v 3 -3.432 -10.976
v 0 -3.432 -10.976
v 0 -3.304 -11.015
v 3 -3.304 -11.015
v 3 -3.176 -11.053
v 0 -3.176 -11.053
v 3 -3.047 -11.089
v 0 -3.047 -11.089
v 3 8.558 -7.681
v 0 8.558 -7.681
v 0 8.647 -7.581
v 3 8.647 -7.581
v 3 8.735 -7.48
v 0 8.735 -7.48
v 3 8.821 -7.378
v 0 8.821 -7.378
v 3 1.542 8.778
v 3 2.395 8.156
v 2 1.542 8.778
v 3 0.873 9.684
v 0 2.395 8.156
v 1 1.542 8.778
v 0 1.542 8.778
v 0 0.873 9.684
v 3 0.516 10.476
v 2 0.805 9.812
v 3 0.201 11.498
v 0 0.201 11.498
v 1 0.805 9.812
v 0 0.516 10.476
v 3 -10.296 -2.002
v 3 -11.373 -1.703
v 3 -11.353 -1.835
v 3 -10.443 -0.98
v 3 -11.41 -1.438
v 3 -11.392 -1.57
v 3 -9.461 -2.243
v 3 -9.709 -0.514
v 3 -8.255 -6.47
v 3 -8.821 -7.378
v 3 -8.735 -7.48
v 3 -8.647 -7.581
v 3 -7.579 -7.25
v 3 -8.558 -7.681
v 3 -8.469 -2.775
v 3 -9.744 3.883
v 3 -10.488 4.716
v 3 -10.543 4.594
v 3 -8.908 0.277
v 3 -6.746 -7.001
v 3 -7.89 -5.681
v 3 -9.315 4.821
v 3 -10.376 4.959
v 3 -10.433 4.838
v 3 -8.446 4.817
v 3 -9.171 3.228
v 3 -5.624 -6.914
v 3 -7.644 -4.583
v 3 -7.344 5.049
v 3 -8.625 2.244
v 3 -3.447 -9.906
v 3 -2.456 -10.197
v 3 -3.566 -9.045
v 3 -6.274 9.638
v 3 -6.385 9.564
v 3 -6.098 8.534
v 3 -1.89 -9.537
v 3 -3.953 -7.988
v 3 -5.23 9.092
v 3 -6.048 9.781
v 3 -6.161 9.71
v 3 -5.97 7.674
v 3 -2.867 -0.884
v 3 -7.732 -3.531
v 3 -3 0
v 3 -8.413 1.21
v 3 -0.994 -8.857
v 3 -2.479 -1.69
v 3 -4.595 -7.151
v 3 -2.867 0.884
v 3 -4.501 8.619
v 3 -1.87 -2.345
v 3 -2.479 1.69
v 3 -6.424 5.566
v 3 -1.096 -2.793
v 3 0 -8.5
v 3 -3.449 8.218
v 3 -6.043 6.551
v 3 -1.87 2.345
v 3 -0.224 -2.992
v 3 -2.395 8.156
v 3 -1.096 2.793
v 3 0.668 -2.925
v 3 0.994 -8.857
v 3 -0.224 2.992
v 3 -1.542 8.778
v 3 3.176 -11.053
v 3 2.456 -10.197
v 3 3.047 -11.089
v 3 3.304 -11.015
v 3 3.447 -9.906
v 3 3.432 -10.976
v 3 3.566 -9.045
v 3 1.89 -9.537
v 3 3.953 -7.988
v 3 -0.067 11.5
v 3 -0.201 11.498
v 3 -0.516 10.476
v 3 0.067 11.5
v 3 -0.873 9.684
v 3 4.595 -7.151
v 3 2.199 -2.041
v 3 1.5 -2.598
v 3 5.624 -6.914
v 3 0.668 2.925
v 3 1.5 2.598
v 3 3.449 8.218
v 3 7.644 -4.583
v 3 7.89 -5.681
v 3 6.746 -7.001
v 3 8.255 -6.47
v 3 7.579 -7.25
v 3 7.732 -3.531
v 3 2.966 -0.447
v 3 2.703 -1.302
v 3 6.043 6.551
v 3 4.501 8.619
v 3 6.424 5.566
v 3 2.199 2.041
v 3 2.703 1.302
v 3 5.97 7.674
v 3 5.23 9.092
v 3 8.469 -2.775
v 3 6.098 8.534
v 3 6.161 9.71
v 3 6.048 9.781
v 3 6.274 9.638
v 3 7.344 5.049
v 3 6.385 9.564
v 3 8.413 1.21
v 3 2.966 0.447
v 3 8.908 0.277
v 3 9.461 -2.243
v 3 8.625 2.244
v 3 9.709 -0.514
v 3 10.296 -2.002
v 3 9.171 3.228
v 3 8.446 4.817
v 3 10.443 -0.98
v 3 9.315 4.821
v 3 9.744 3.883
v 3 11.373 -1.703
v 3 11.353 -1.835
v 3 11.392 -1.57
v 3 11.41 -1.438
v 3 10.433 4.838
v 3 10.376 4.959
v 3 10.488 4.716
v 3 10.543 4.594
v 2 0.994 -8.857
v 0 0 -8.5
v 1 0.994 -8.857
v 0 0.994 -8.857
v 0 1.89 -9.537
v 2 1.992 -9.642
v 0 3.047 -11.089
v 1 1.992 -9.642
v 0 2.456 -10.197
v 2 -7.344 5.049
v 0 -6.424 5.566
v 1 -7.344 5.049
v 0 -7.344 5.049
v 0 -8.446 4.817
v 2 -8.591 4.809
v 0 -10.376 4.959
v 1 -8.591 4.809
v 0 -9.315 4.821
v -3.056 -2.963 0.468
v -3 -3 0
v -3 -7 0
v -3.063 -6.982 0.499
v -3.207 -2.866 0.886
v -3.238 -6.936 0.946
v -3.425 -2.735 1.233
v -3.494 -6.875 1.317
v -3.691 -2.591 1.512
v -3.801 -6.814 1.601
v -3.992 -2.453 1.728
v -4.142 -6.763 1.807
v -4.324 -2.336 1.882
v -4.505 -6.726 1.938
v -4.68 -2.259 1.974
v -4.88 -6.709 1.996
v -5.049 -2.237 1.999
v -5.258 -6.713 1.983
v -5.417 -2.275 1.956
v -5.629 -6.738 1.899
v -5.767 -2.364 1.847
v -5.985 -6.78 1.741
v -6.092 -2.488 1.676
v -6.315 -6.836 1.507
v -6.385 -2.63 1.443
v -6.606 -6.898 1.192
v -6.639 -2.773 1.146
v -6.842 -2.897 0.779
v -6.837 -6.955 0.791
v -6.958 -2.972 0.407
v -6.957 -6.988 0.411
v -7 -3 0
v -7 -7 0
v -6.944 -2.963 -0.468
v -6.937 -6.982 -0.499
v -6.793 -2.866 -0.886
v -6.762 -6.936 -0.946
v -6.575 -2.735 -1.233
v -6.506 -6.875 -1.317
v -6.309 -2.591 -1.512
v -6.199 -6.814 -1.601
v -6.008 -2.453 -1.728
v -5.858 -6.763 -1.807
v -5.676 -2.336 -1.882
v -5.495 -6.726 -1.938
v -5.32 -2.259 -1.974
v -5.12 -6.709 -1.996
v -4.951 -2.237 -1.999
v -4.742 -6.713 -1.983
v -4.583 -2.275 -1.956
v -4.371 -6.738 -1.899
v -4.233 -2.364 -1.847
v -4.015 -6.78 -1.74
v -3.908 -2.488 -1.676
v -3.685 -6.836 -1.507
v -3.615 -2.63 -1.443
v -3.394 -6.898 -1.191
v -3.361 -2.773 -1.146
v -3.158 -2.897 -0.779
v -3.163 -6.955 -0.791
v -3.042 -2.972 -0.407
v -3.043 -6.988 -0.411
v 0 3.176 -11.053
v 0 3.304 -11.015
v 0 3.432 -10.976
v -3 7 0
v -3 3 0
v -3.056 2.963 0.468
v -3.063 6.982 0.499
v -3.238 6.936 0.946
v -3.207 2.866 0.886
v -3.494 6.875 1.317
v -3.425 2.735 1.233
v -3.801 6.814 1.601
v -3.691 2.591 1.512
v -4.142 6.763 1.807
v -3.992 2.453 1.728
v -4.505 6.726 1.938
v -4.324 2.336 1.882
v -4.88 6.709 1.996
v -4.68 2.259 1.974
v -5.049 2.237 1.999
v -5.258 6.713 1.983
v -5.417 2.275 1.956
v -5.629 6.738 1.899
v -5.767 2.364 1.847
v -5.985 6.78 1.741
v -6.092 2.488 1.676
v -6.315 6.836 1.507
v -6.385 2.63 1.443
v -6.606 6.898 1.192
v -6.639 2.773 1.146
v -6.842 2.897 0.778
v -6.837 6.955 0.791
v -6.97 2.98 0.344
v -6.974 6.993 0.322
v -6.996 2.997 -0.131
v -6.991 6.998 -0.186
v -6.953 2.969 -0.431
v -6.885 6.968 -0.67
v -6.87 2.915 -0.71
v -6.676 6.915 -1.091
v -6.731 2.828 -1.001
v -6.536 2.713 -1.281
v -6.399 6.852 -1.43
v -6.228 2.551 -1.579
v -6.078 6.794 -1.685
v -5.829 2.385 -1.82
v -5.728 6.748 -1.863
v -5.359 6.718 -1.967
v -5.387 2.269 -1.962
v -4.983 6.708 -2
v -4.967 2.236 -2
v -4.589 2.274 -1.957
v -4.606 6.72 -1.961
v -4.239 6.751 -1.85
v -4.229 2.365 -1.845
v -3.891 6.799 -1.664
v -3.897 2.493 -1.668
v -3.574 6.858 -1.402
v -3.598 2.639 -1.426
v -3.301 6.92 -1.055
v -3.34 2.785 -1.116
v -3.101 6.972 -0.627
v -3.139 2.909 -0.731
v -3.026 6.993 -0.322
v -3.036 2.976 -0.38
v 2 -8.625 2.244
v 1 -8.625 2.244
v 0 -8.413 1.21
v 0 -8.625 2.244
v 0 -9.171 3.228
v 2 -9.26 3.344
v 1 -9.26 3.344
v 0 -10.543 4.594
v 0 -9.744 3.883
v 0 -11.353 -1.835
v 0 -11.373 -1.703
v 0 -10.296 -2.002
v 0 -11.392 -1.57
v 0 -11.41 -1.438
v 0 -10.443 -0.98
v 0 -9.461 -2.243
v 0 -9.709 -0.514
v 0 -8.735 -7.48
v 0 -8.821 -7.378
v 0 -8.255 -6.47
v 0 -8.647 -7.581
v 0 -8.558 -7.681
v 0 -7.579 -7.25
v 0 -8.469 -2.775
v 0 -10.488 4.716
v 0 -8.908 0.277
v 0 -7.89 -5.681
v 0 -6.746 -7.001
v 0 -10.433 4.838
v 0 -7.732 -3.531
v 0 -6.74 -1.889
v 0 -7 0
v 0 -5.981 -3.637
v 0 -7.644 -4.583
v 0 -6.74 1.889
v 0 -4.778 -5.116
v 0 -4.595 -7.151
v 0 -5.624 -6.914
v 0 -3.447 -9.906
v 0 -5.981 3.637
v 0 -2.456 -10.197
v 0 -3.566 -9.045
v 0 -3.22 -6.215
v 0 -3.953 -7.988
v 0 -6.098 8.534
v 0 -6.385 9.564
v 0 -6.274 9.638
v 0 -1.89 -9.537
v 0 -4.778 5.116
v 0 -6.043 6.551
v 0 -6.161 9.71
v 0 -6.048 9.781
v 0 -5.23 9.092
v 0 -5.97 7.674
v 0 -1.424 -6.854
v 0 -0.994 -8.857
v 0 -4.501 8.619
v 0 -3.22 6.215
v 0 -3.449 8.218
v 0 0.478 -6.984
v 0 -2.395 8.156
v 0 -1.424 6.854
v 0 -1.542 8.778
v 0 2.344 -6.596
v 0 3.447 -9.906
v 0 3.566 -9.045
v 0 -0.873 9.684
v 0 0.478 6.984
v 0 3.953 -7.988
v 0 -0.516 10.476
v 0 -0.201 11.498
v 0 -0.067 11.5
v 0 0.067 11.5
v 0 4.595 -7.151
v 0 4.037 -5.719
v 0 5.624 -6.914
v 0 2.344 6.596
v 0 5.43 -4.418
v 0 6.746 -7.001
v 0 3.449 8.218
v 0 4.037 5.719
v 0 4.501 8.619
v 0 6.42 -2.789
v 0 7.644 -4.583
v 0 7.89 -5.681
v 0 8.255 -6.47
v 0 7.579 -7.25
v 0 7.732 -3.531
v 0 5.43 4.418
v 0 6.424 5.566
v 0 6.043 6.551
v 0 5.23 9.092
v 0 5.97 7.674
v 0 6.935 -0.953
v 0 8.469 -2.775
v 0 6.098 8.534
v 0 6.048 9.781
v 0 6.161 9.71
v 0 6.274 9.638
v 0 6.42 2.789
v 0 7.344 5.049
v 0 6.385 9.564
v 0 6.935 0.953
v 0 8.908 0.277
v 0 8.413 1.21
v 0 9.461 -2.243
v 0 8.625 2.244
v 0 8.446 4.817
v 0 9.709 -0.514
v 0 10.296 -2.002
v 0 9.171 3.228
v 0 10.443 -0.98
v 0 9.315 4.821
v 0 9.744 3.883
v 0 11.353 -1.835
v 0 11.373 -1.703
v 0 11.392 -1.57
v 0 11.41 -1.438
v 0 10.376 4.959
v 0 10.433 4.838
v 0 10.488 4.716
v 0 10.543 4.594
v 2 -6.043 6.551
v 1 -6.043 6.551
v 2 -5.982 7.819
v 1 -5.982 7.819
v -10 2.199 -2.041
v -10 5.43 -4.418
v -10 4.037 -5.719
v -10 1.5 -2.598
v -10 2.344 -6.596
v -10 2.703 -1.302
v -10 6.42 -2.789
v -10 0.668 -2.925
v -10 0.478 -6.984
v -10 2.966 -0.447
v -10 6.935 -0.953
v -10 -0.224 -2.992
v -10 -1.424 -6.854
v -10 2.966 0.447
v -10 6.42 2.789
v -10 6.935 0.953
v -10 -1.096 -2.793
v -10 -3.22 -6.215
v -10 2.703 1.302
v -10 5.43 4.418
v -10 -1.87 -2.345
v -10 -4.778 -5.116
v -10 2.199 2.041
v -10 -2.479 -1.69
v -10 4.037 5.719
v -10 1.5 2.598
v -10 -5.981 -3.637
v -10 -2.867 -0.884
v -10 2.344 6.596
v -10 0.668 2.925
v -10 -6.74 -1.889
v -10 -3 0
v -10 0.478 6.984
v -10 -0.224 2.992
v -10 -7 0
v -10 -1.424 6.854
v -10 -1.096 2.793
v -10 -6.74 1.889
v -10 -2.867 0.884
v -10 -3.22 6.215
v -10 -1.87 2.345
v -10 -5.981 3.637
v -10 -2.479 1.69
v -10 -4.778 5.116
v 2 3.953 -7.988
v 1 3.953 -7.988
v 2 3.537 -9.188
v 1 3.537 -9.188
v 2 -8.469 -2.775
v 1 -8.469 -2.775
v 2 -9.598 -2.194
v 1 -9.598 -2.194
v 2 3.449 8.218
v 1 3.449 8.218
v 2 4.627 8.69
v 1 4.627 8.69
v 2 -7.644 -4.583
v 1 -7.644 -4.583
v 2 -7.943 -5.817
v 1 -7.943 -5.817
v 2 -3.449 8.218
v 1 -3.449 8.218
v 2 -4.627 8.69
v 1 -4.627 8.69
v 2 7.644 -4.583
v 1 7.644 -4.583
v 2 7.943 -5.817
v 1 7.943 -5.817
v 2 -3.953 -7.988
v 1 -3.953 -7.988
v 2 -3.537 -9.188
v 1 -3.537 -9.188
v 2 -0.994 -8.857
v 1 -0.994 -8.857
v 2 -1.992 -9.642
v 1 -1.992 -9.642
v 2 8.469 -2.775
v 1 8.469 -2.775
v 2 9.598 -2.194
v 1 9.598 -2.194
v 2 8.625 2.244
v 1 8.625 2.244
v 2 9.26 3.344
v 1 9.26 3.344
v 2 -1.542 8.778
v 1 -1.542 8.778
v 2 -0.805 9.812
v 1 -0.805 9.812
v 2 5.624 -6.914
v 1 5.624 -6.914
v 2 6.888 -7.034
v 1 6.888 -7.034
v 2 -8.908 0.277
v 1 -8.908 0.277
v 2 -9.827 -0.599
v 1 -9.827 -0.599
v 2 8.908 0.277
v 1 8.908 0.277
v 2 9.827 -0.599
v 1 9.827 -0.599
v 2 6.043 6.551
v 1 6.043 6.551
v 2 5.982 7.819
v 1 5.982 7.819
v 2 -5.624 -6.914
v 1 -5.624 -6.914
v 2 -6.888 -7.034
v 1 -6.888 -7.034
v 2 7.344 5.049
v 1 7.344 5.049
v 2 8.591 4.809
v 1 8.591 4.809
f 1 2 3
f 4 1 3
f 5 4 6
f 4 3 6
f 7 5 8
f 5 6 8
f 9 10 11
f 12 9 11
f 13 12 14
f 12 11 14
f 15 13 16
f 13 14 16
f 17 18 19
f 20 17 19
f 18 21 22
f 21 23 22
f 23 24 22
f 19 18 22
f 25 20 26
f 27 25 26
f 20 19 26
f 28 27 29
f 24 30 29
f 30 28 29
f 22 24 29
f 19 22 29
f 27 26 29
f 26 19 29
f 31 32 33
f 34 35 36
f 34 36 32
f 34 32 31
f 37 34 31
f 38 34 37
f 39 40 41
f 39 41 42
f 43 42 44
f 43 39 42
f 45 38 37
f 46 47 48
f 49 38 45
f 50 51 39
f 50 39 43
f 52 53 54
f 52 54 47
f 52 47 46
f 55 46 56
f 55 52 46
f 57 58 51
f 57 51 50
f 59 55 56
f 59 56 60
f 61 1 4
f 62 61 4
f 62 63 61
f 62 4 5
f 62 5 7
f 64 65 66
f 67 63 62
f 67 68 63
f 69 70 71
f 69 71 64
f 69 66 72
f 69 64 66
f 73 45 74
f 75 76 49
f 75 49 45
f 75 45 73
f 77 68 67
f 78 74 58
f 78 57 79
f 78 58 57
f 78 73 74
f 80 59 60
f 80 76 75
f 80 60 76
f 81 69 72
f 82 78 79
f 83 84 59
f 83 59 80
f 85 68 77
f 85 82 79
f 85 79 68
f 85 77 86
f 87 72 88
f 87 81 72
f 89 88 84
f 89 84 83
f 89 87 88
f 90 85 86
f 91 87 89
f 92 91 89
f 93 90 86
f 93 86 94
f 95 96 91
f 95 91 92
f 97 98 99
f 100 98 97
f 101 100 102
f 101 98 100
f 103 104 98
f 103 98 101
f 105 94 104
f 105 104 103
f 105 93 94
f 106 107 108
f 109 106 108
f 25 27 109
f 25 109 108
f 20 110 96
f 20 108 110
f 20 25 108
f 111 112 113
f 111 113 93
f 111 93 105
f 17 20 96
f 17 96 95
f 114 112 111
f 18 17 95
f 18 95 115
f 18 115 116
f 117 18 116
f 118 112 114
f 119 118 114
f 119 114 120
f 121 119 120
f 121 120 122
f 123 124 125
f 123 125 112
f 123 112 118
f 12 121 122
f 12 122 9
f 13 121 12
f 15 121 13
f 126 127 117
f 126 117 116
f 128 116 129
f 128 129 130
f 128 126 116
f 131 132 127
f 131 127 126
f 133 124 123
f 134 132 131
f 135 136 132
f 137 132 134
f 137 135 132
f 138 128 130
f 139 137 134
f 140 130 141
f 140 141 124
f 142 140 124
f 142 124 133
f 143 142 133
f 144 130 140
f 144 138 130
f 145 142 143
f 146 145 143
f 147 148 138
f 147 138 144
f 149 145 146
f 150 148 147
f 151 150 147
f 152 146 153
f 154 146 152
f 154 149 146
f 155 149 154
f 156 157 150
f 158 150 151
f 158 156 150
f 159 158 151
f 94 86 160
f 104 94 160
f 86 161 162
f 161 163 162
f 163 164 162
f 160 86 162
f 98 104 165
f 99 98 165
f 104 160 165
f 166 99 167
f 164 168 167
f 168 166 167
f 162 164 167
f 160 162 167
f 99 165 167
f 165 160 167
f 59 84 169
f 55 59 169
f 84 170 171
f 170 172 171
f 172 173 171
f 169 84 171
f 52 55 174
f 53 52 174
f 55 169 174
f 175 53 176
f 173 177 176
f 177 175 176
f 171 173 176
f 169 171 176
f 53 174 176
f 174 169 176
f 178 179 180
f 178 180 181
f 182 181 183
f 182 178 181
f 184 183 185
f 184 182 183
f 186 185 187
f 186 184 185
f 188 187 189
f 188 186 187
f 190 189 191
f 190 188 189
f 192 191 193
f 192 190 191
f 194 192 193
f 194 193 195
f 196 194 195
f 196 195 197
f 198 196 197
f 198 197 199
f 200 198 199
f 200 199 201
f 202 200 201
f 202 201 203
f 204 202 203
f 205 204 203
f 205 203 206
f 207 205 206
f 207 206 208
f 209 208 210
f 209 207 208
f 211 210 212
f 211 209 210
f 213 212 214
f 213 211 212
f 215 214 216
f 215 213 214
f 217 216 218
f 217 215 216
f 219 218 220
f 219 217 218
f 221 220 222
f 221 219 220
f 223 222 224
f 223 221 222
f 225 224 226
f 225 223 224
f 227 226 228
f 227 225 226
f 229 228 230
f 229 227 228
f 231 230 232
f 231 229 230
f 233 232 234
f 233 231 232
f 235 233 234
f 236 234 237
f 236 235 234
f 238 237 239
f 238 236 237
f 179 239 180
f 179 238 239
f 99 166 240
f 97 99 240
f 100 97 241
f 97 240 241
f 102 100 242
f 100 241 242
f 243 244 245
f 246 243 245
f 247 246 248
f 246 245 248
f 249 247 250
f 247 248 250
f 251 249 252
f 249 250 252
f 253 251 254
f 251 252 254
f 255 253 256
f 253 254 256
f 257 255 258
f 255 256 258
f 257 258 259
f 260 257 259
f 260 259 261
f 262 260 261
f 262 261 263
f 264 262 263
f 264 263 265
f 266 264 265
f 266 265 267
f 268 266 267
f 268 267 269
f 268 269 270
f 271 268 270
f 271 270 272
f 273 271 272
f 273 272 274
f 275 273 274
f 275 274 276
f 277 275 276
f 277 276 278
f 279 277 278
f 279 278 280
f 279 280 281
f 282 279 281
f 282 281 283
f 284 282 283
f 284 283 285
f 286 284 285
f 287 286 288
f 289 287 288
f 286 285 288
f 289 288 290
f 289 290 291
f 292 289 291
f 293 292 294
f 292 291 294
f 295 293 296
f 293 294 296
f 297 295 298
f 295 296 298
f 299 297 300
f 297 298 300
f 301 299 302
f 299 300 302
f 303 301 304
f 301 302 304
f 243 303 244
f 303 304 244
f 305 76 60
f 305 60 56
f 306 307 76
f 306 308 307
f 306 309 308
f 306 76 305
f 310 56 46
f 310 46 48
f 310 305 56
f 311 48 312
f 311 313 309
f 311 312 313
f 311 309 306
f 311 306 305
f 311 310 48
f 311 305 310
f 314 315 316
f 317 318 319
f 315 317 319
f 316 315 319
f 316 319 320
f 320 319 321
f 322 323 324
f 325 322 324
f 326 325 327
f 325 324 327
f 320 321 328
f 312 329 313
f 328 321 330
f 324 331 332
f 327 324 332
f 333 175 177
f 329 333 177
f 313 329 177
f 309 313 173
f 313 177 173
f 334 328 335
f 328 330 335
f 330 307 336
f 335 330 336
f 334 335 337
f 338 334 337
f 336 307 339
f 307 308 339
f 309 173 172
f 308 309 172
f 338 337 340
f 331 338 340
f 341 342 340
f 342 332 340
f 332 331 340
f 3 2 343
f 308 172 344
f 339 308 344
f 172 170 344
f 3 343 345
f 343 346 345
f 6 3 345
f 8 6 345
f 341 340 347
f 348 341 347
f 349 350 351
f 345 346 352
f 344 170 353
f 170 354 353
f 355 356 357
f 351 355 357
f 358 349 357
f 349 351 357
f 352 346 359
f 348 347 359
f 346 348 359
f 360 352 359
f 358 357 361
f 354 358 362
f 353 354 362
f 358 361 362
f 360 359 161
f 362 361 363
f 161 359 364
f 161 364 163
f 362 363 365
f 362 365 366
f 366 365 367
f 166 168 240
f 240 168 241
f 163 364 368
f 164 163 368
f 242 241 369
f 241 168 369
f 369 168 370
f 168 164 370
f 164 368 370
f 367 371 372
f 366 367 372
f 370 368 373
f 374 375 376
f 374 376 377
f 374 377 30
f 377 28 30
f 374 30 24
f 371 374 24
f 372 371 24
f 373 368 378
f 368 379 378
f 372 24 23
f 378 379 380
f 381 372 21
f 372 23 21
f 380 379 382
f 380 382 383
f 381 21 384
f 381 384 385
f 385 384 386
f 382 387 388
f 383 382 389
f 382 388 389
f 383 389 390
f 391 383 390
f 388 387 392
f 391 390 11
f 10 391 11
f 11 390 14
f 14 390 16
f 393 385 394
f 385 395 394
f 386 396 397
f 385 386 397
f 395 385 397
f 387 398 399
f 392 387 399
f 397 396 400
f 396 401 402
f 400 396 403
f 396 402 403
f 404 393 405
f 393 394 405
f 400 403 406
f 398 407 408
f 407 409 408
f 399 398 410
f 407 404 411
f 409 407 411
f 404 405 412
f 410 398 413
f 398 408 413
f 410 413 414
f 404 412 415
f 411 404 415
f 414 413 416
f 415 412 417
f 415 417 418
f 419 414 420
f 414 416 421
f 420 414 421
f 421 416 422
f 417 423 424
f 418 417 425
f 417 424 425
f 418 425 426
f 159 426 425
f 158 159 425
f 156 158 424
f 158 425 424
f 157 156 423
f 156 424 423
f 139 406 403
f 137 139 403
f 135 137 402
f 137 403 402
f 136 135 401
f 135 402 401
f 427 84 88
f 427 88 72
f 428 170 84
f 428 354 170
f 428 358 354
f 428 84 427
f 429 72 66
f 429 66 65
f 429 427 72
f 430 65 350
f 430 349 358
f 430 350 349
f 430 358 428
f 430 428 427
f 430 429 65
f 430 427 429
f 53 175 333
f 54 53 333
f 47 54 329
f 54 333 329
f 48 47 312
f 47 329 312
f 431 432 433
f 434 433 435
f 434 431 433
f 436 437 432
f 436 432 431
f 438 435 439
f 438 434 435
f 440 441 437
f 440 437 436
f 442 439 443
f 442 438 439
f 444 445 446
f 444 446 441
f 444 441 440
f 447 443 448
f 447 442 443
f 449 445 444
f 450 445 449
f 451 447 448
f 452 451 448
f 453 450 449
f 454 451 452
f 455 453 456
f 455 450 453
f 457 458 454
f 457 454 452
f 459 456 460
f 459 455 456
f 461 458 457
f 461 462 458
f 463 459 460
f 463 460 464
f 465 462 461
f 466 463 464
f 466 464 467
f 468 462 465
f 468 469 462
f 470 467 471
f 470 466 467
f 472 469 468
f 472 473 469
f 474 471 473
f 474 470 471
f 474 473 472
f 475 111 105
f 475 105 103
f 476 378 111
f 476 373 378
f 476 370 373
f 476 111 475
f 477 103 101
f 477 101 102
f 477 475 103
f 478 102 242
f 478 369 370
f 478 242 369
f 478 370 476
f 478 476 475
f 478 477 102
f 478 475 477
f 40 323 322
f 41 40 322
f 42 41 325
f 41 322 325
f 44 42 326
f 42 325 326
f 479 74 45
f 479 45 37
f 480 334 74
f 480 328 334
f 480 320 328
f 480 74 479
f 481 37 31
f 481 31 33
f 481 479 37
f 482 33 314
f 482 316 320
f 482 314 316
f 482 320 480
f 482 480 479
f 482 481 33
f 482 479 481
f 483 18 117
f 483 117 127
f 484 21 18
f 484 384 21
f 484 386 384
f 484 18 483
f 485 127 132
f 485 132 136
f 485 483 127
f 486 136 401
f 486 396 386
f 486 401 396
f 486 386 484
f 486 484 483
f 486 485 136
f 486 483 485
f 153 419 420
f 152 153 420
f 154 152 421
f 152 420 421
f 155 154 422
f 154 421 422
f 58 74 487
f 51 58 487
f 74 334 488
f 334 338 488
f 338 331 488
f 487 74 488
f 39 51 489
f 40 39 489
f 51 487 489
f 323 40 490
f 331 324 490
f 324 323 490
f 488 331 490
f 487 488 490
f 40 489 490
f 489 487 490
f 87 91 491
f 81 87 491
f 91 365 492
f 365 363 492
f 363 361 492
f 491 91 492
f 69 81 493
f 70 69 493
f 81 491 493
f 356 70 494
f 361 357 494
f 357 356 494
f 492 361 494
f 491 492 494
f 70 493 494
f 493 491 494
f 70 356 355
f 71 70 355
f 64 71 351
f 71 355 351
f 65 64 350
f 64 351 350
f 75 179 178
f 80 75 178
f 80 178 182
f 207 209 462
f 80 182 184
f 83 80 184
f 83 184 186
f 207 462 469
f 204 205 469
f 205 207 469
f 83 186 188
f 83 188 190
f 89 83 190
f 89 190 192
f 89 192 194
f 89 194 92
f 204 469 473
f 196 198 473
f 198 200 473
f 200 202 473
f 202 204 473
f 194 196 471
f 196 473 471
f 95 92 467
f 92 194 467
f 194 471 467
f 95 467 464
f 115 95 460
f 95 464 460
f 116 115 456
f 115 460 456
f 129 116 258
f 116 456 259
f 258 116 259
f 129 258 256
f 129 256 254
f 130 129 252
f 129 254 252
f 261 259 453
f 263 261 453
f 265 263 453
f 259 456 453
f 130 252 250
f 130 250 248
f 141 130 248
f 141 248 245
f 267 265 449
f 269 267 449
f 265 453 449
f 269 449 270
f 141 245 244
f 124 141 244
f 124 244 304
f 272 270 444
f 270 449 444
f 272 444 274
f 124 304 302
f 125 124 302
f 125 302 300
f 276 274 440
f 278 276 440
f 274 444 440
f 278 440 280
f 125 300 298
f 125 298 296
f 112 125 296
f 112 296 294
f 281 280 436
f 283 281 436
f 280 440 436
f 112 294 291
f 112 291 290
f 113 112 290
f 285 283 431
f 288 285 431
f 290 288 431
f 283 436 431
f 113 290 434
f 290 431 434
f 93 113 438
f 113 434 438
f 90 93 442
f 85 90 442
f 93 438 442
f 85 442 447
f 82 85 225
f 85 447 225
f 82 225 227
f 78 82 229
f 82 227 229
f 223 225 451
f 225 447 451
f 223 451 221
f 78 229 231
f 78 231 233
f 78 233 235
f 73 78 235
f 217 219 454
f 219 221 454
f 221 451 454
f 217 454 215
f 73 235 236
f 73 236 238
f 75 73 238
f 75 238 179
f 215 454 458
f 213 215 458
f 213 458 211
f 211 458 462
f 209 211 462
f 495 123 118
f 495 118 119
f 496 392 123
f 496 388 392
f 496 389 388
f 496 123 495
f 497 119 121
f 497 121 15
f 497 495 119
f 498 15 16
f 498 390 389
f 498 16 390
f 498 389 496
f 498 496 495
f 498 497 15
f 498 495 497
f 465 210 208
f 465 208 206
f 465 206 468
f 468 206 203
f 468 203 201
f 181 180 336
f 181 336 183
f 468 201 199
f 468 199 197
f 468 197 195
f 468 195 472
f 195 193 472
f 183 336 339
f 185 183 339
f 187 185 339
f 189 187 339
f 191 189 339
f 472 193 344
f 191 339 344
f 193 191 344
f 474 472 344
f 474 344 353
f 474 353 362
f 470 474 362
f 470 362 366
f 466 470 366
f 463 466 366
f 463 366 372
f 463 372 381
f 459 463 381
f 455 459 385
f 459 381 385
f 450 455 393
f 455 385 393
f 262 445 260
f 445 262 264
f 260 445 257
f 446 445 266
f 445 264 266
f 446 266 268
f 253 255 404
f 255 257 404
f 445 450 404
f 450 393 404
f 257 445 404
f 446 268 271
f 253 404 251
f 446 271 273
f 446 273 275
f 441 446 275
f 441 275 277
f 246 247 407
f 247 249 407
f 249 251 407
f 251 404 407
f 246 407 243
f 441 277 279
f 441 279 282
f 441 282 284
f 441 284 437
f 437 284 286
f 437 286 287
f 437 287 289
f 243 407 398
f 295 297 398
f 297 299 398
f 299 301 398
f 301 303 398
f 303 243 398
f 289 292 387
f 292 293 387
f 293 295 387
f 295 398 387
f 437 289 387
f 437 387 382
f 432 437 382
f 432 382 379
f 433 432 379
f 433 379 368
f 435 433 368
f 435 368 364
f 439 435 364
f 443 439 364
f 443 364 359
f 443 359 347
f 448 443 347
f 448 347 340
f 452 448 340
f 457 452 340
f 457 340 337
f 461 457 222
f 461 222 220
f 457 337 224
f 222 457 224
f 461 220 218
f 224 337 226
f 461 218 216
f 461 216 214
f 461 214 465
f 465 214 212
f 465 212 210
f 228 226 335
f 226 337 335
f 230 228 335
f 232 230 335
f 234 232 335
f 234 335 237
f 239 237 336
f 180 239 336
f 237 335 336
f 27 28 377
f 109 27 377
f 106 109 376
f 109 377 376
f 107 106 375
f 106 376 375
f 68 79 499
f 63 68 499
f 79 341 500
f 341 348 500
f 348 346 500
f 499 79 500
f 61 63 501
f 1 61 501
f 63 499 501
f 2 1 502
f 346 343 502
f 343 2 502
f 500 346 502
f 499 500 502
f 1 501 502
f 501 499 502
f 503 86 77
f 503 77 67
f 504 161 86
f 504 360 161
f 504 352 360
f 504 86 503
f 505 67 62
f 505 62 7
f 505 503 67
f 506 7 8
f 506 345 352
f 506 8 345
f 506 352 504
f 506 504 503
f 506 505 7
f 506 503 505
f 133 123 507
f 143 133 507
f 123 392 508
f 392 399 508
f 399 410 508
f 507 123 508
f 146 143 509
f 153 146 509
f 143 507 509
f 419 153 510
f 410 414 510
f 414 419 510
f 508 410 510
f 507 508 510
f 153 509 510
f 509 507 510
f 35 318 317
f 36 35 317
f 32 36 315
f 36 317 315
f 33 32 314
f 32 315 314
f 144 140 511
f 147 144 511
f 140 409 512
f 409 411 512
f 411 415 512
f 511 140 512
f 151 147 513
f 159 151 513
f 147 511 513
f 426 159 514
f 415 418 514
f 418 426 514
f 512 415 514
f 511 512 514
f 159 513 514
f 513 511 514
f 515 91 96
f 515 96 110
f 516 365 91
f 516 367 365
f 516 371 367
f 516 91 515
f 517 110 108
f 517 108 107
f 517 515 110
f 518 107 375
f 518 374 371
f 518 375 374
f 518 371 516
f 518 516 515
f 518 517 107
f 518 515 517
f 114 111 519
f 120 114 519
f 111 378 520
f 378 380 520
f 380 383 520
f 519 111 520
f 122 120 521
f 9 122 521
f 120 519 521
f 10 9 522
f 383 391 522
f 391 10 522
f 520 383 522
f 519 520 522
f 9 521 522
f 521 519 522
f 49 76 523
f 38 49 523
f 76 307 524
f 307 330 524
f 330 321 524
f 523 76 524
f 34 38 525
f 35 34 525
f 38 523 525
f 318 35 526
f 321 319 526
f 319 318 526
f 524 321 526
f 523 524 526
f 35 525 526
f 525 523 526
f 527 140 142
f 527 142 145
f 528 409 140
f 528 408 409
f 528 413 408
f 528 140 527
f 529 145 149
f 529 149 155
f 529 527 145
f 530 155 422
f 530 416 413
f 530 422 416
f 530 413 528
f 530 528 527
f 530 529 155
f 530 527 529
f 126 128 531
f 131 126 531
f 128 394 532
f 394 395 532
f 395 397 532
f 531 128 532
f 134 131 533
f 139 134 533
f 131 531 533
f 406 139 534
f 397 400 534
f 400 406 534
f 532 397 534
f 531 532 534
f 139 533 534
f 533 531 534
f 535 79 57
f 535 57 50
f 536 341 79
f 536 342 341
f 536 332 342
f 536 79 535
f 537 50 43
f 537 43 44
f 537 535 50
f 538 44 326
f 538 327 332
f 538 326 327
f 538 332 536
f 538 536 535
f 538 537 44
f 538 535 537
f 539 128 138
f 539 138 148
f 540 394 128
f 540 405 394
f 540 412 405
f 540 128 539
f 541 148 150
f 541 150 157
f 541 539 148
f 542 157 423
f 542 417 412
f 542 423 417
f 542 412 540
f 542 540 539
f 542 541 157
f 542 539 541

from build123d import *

# Parameters (mm, degrees)
F1_DEPTH  = 3
F2_COUNT  = 11
F3_R      = 7
F4_DEPTH  = 10
F5_R      = 3
F6_DEPTH  = 13.001
F7_R      = 2
F8_DEPTH  = 11.410776
F9_R      = 2
F10_DEPTH = 11.410776


with BuildPart() as f1:
    # F0 (on Right) → F1 (new body)
    with BuildSketch(Plane.YZ):
        with BuildLine():
            add(Edge.make_bspline(
                [(2.394727, 8.15569), (1.48914, 8.651781), (0.734067, 9.406854), (0.200703, 11.498248)],
                knots=[0, 0, 0, 0, 3.998304, 3.998304, 3.998304, 3.998304], degree=3))
            ThreePointArc((0.200703, 11.498248), (0, 11.5), (-0.200703, 11.498248))
            add(Edge.make_bspline(
                [(-2.394727, 8.15569), (-1.48914, 8.651781), (-0.734067, 9.406854), (-0.200703, 11.498248)],
                knots=[0, 0, 0, 0, 3.998304, 3.998304, 3.998304, 3.998304], degree=3))
            Line((-2.394727, 8.15569), (0, 0))
            Line((0, 0), (2.394727, 8.15569))
        make_face()
    extrude(amount=F1_DEPTH)

    # F2: F1 ×11 about axis
    f2_axis = Axis((1.5, 0, 0), (1, 0, 0))


with BuildPart() as f1_1:
    add(f1.part)
    for i in range(1, F2_COUNT):
        add(f1.part.rotate(f2_axis, i * 360 / F2_COUNT))

    # F3 (on face) → F4 (join)
    with BuildSketch(Plane(origin=(0, 0, 0), x_dir=(0, -1, 0), z_dir=(-1, 0, 0))):
        Circle(F3_R)
    extrude(amount=F4_DEPTH)

    # F5 (on face) → F6 (cut, through all)
    with BuildSketch(Plane(origin=(-10, 0, 0), x_dir=(0, -1, 0), z_dir=(-1, 0, 0))):
        Circle(F5_R)
    extrude(amount=-F6_DEPTH, mode=Mode.SUBTRACT)

    # F7 (on Front) → F8 (cut, through all)
    with BuildSketch(Plane.XZ):
        with Locations((-5, 0)):
            Circle(F7_R)
    extrude(amount=-F8_DEPTH, mode=Mode.SUBTRACT)

    # F9 (on Front) → F10 (cut, through all)
    with BuildSketch(Plane.XZ):
        with Locations((-5, 0)):
            Circle(F9_R)
    extrude(amount=F10_DEPTH, mode=Mode.SUBTRACT)


solid = f1_1.part
